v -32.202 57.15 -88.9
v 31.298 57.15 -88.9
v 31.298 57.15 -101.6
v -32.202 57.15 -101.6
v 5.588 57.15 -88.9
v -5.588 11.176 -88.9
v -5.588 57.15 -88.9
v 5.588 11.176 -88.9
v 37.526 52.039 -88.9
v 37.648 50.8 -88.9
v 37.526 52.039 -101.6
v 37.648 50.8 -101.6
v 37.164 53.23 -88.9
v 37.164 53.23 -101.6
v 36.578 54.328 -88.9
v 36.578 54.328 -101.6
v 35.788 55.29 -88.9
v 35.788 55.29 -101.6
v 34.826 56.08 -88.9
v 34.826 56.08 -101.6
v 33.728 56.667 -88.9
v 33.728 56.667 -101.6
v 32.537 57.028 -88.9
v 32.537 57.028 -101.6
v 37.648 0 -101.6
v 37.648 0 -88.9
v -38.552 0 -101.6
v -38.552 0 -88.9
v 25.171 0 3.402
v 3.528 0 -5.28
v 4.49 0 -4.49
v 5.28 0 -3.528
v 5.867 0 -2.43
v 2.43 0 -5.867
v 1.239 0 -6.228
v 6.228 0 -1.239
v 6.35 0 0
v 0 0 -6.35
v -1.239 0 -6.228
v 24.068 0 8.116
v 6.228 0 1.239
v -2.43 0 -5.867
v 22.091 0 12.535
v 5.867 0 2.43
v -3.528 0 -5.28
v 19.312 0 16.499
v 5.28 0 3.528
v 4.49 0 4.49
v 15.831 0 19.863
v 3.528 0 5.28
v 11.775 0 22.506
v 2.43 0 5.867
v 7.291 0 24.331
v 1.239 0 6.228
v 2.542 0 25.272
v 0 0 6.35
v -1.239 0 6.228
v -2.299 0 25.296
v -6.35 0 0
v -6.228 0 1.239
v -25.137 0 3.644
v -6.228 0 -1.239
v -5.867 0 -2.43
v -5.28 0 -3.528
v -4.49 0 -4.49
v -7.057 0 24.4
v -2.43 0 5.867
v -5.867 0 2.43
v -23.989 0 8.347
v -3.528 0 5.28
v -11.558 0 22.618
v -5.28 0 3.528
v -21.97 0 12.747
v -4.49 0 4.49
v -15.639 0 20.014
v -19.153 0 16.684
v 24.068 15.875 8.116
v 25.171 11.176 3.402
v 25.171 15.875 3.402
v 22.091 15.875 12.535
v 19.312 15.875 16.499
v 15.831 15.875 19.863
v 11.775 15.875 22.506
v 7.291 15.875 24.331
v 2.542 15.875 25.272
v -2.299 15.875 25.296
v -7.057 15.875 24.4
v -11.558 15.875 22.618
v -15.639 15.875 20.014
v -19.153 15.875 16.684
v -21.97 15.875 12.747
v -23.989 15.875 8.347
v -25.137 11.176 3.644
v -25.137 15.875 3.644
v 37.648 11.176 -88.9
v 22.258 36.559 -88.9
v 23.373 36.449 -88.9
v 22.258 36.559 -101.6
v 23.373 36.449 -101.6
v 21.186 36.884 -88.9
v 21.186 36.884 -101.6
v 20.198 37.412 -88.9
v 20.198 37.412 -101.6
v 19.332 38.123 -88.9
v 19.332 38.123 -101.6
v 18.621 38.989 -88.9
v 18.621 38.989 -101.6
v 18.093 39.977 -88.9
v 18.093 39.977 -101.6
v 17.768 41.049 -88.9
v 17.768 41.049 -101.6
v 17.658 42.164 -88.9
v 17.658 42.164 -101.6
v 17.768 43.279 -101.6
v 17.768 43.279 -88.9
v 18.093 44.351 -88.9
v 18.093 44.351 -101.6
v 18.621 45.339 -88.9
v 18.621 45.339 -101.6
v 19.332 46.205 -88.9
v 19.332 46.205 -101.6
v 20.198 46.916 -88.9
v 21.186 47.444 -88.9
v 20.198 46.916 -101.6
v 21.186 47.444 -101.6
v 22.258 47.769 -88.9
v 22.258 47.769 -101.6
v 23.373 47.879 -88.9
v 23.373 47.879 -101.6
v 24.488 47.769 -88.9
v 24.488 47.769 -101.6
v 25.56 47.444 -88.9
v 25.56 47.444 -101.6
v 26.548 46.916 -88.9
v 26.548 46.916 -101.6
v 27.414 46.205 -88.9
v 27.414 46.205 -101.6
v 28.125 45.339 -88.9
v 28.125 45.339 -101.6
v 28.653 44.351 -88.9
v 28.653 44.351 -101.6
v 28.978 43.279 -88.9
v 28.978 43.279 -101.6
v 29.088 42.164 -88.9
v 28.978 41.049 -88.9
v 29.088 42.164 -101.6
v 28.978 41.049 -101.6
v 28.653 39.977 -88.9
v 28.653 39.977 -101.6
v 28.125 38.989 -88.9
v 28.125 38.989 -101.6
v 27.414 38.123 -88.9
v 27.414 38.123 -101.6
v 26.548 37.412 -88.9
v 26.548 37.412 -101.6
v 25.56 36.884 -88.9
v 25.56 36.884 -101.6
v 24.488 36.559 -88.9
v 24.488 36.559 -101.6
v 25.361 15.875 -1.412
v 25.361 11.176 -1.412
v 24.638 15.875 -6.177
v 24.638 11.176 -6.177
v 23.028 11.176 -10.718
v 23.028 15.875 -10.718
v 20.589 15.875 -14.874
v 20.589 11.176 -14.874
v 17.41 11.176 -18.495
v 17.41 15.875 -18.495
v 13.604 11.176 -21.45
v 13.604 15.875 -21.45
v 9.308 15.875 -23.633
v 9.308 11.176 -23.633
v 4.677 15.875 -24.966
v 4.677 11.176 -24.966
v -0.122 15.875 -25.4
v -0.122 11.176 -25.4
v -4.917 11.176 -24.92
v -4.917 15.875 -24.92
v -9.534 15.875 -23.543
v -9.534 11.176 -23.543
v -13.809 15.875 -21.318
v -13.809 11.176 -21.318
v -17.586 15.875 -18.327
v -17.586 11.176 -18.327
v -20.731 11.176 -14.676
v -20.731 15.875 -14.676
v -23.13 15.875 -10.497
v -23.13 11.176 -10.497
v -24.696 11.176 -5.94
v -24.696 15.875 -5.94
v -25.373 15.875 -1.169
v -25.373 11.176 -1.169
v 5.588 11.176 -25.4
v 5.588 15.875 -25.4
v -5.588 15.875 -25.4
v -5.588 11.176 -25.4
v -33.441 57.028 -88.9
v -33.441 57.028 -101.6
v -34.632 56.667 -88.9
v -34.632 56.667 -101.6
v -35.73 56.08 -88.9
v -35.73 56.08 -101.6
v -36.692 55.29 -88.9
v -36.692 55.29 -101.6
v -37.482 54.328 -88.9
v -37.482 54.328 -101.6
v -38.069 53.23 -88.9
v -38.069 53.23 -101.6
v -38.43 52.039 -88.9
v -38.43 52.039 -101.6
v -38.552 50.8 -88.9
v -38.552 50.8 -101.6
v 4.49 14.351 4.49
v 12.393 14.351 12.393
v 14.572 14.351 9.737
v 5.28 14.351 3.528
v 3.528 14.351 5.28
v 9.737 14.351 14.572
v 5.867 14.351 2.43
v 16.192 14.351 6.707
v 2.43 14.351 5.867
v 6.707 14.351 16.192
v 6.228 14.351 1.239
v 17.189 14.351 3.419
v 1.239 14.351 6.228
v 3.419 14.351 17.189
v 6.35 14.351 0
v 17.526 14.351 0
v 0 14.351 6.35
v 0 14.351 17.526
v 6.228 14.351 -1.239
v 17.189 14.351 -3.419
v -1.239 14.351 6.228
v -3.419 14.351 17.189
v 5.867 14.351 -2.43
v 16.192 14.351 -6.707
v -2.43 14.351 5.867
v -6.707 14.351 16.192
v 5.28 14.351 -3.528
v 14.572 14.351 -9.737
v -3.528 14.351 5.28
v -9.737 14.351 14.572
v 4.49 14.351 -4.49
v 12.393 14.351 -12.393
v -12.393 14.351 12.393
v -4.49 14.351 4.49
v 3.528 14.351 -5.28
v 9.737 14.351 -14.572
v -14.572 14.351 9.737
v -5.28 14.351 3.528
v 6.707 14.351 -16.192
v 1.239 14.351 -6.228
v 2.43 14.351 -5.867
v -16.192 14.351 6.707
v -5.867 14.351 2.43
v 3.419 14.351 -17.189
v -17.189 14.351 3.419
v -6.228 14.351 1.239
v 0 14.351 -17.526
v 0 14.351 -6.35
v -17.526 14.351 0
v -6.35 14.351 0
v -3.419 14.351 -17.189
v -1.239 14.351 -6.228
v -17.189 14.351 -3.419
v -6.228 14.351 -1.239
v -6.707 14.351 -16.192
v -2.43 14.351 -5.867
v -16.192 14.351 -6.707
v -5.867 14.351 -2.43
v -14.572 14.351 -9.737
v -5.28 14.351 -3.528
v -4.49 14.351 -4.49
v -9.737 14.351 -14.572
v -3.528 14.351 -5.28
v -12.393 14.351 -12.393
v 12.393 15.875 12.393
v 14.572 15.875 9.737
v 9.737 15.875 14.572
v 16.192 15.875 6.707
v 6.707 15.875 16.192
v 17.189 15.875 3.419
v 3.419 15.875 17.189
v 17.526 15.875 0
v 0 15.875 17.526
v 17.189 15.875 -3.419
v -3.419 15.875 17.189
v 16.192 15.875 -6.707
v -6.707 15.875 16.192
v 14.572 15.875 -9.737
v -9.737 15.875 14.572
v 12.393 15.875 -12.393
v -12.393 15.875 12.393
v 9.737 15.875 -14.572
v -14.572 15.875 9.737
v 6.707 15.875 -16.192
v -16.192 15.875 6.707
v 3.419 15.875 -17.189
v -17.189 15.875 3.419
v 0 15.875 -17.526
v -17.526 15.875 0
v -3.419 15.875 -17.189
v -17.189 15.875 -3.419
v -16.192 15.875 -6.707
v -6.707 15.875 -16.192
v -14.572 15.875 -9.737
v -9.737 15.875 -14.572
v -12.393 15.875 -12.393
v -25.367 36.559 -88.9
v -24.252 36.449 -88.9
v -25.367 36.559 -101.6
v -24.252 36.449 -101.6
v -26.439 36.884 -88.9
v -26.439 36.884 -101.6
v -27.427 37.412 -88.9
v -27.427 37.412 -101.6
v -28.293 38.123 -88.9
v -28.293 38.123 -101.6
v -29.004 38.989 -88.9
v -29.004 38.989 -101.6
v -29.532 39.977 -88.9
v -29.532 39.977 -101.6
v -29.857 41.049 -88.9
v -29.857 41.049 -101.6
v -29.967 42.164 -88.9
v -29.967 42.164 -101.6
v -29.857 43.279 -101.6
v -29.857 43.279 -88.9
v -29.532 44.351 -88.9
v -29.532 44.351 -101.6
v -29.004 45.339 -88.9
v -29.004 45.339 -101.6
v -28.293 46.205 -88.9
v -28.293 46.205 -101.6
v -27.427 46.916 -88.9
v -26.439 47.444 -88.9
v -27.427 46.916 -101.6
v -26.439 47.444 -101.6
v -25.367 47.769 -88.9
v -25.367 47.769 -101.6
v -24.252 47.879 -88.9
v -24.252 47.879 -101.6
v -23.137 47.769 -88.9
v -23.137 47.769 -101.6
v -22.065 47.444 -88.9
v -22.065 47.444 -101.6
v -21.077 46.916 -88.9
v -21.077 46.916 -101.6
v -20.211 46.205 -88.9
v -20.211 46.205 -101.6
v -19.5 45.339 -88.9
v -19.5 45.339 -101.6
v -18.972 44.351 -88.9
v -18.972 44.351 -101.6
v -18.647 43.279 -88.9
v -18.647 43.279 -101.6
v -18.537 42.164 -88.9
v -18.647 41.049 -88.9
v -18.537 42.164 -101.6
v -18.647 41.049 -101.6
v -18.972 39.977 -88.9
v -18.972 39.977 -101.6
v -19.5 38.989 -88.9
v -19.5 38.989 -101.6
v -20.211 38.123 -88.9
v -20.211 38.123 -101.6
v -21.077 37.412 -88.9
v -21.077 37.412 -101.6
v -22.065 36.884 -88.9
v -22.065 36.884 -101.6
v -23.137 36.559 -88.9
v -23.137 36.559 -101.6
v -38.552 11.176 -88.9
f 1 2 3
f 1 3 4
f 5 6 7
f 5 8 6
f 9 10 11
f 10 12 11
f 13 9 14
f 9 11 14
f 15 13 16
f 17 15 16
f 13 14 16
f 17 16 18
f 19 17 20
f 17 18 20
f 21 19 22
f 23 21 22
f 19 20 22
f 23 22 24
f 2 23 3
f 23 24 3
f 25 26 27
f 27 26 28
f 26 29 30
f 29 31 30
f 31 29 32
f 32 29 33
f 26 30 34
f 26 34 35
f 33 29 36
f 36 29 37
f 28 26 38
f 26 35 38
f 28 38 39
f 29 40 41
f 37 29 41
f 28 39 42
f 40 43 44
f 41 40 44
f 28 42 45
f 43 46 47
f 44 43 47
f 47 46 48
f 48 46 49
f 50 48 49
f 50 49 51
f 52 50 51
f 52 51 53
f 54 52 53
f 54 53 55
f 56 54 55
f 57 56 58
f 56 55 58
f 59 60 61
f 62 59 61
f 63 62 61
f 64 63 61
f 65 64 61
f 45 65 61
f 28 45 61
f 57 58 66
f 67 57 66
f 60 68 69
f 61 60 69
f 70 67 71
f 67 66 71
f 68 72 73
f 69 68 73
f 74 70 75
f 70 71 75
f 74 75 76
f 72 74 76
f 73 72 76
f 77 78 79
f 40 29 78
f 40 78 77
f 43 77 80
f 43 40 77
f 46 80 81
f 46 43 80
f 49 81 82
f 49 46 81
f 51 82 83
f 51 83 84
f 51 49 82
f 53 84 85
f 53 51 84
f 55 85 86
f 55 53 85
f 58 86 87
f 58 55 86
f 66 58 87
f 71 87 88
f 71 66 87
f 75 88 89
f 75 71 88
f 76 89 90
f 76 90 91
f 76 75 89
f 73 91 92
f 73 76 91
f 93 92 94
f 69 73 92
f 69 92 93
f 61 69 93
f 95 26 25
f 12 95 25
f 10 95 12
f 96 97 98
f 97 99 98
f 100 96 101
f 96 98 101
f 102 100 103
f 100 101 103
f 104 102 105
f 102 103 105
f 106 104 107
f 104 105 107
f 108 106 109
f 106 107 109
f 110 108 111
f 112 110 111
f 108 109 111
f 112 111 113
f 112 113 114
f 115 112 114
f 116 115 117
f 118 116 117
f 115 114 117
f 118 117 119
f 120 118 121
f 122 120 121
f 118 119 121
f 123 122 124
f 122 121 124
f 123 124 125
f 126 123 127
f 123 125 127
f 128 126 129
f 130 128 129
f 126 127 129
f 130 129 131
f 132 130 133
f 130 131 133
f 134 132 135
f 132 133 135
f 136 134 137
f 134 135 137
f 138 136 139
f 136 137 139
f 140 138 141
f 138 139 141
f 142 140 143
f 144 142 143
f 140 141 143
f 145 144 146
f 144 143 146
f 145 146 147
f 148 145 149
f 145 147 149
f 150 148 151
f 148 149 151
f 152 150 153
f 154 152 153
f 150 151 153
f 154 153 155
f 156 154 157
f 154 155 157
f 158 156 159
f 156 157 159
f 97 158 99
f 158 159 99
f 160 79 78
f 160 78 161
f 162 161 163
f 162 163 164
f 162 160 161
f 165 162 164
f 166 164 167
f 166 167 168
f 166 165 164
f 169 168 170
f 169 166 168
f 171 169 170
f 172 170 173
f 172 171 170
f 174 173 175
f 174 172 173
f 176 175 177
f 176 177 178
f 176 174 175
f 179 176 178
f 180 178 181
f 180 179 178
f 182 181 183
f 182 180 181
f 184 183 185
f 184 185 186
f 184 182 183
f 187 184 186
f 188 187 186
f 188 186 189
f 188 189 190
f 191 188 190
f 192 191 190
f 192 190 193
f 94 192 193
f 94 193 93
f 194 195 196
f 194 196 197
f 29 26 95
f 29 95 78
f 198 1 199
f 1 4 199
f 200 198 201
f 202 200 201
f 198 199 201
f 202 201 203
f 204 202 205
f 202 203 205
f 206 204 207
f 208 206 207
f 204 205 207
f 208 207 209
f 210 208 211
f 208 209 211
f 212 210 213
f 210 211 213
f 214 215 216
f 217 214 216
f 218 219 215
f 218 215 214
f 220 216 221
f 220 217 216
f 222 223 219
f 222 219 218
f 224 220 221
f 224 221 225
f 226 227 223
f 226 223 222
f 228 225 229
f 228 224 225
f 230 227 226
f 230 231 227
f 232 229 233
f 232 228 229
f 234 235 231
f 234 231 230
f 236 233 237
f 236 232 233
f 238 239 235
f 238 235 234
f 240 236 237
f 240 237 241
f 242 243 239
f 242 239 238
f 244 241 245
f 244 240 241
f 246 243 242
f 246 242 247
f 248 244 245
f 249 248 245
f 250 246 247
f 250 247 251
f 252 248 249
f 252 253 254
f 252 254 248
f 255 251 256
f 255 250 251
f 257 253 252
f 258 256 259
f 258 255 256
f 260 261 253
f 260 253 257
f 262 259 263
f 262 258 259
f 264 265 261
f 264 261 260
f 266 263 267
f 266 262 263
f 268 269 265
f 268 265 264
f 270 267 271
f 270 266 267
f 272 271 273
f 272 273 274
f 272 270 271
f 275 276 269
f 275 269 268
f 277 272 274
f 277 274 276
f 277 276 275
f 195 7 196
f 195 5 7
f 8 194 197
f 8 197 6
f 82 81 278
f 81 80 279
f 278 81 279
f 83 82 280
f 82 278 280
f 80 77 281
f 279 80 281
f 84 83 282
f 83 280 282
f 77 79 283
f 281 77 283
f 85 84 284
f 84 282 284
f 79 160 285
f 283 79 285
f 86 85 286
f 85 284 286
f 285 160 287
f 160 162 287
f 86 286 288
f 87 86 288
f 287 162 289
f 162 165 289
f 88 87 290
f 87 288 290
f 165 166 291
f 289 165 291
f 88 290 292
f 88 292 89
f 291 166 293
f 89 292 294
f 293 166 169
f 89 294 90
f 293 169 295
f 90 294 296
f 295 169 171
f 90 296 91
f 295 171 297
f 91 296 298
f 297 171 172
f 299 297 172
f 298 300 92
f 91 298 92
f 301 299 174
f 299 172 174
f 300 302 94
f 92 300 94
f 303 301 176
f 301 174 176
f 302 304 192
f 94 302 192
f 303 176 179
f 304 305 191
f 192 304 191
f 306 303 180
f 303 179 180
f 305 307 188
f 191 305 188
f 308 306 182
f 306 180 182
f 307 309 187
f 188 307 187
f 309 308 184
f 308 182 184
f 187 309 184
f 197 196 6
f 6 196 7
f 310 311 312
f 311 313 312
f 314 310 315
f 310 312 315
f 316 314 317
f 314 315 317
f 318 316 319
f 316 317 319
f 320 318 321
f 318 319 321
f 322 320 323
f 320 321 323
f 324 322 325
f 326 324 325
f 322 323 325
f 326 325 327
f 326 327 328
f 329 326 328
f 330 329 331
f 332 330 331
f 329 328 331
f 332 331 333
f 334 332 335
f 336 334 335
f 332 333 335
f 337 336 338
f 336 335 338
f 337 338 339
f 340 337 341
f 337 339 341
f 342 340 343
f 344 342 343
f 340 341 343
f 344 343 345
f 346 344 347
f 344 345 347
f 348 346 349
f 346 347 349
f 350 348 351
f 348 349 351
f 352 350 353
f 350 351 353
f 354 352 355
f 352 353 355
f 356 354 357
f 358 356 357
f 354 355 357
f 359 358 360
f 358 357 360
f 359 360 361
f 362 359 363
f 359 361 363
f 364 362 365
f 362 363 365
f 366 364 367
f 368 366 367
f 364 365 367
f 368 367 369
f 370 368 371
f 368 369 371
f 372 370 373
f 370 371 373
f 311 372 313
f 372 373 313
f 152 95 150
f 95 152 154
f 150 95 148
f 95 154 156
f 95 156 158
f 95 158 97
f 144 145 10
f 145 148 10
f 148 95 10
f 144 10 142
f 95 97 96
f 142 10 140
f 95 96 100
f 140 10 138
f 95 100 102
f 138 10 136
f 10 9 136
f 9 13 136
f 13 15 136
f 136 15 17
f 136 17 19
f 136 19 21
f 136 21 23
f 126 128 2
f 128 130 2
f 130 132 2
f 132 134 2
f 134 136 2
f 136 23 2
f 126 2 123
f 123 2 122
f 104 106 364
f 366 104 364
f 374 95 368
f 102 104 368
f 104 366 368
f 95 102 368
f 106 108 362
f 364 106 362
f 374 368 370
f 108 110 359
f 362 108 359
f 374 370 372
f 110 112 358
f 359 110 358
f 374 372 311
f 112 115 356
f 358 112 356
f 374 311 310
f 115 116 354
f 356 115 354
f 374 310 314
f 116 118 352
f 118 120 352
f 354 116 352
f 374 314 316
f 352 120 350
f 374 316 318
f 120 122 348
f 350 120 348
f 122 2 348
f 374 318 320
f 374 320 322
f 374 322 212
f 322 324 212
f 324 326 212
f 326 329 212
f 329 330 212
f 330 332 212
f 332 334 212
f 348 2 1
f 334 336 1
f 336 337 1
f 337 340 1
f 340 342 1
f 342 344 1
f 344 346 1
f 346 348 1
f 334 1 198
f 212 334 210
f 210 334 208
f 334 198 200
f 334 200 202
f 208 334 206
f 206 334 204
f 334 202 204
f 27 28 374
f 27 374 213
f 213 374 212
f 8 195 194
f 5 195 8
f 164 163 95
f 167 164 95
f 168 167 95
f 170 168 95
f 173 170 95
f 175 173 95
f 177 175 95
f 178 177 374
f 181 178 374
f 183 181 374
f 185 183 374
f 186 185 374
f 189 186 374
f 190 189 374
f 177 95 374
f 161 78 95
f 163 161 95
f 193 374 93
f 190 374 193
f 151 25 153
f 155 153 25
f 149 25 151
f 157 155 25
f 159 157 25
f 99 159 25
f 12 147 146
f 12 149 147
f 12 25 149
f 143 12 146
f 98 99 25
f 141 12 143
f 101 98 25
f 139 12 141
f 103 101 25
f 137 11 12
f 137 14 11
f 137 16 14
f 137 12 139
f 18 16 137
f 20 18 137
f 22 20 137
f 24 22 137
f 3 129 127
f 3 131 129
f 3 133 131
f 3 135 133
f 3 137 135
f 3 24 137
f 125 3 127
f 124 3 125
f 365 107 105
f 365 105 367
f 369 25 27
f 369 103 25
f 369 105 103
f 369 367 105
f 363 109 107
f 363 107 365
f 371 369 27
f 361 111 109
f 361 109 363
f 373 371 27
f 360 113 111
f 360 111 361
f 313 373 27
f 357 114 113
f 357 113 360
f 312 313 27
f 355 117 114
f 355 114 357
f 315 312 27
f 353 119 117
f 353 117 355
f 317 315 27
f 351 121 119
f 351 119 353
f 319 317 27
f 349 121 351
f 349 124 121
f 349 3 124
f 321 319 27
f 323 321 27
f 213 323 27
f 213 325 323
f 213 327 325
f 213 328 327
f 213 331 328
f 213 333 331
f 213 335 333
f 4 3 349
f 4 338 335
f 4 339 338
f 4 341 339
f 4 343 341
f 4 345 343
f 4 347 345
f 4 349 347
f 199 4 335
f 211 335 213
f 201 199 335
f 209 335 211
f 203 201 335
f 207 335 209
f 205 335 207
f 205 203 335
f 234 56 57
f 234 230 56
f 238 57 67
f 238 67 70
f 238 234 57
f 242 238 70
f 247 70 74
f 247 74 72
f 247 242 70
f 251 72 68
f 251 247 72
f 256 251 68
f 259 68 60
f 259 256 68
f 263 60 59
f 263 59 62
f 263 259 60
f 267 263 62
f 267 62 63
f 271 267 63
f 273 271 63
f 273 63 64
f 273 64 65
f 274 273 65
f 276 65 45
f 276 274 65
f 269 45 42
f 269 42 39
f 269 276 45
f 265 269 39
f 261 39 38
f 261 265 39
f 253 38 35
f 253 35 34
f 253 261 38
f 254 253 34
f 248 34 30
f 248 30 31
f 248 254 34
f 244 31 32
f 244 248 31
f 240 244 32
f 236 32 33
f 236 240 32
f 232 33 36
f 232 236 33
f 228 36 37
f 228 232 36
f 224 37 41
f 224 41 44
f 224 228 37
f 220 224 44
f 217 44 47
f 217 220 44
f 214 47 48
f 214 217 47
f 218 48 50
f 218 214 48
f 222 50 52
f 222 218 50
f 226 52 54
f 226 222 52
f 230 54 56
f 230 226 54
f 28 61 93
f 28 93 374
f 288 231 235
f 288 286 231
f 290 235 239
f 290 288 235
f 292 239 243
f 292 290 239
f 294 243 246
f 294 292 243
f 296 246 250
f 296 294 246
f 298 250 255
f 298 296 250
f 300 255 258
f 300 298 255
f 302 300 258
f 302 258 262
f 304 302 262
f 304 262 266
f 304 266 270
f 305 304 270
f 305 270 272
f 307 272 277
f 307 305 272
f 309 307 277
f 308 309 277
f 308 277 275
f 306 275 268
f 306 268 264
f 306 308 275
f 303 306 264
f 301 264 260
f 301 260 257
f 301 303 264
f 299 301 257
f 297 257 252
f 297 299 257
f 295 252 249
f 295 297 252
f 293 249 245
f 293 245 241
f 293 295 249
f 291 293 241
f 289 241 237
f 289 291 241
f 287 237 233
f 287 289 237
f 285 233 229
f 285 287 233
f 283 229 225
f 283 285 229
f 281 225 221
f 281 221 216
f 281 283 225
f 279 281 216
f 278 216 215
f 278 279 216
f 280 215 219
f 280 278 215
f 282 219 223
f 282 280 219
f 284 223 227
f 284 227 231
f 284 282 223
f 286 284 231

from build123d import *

# Parameters (mm, degrees)
BOSS_EXTRUDE1_DEPTH                  = 15.875
CUT_EXTRUDE1_START                   = -4.699
CUT_EXTRUDE1_DEPTH                   = 4.699
SKETCH4_W                            = 76.2
SKETCH4_H                            = 57.15
BOSS_EXTRUDE2_DEPTH                  = 12.7
BOSS_EXTRUDE4_DEPTH                  = 5.588
SKETCH9_W                            = 5.715
SKETCH9_H                            = 12.7
F_1_4_0_45_DIAMETER_HOLE1_AT_2_COUNT = 2
F_1_4_0_45_DIAMETER_HOLE1_AT_2_PITCH = 47.625
FILLET1_R                            = 6.35


with BuildPart() as part:
    # Sketch1 → Boss-Extrude1 (new body)
    with BuildSketch(Plane(origin=(0, 0, 0), x_dir=(1, 0, 0), z_dir=(0, 1, 0))):
        with BuildLine():
            Line((-25.137268282, -3.643863787), (-38.552299312, 88.9))
            Line((-38.552299312, 88.9), (37.647700688, 88.9))
            Line((37.647700688, 88.9), (25.171087732, -3.40240244))
            ThreePointArc((25.171087732, -3.40240244), (0.121909123, -25.399707443), (-25.137268282, -3.643863787))
        make_face()
    extrude(amount=BOSS_EXTRUDE1_DEPTH)

    # Sketch2 → Cut-Extrude1 (cut)
    with BuildSketch(Plane(origin=(0, 15.875, 0), x_dir=(1, 0, 0), z_dir=(0, 1, 0)).offset(CUT_EXTRUDE1_START)):
        with BuildLine():
            Line((-38.552299312, 88.9), (37.647700688, 88.9))
            Line((37.647700688, 88.9), (25.171087732, -3.40240244))
            ThreePointArc((25.171087732, -3.40240244), (-0.121909123, 25.399707443), (-25.137268282, -3.643863787))
            Line((-25.137268282, -3.643863787), (-38.552299312, 88.9))
        make_face()
    extrude(amount=CUT_EXTRUDE1_DEPTH, mode=Mode.SUBTRACT)

    # Sketch4 → Boss-Extrude2 (add)
    with BuildSketch(Plane(origin=(0, 0, -88.9), x_dir=(-1, 0, 0), z_dir=(0, 0, -1))):
        with Locations((0.452299312, 28.575)):
            Rectangle(SKETCH4_W, SKETCH4_H)
    extrude(amount=BOSS_EXTRUDE2_DEPTH)

    # Sketch7 → CBORE for 1/4 Binding Head Machine Screw1 (revolve, cut)
    with BuildSketch(Plane(origin=(0, 15.875, 0), x_dir=(0, 0, 1), z_dir=(1, 0, 0))):
        Polygon((0, 0), (0, 15.875), (6.35, 15.875), (6.35, 1.524), (17.526, 1.524), (17.526, 0), align=None)
    revolve(axis=Axis((0, 22.225, 0), (0, -1, 0)), mode=Mode.SUBTRACT)

    # Sketch9 → 1/4 (0.45) Diameter Hole1 (revolve, cut)
    with BuildSketch(Plane(origin=(-24.252099312, 42.164, -88.9), x_dir=(0, -1, 0), z_dir=(1, 0, 0))):
        with Locations((2.8575, 6.35)):
            Rectangle(SKETCH9_W, SKETCH9_H)
    f_1_4_0_45_diameter_hole1 = revolve(axis=Axis((-24.252099312, 42.164, -82.55), (0, 0, -1)), mode=Mode.SUBTRACT)

    # 1/4 (0.45) Diameter Hole1 at 2: 1/4 (0.45) Diameter Hole1 ×2
    with Locations(*[(i * F_1_4_0_45_DIAMETER_HOLE1_AT_2_PITCH, 0, 0) for i in range(1, F_1_4_0_45_DIAMETER_HOLE1_AT_2_COUNT)]):
        add(f_1_4_0_45_diameter_hole1, mode=Mode.SUBTRACT)

    # Fillet1
    fillet1_edges = [part.edges().sort_by_distance(p)[0] for p in [
        (37.647700688, 57.15, -95.25),
        (-38.552299312, 57.15, -95.25),
    ]]
    fillet(fillet1_edges, radius=FILLET1_R)


with BuildPart() as body_2:
    # Sketch5 → Boss-Extrude4 (new, symmetric)
    with BuildSketch(Plane(origin=(0, 0, 0), x_dir=(0, 0, -1), z_dir=(1, 0, 0))):
        Polygon((88.9, 57.15), (25.4, 15.875), (25.4, 11.176), (88.9, 11.176), align=None)
    extrude(amount=BOSS_EXTRUDE4_DEPTH, both=True)


solid = Compound([part.part, body_2.part])
